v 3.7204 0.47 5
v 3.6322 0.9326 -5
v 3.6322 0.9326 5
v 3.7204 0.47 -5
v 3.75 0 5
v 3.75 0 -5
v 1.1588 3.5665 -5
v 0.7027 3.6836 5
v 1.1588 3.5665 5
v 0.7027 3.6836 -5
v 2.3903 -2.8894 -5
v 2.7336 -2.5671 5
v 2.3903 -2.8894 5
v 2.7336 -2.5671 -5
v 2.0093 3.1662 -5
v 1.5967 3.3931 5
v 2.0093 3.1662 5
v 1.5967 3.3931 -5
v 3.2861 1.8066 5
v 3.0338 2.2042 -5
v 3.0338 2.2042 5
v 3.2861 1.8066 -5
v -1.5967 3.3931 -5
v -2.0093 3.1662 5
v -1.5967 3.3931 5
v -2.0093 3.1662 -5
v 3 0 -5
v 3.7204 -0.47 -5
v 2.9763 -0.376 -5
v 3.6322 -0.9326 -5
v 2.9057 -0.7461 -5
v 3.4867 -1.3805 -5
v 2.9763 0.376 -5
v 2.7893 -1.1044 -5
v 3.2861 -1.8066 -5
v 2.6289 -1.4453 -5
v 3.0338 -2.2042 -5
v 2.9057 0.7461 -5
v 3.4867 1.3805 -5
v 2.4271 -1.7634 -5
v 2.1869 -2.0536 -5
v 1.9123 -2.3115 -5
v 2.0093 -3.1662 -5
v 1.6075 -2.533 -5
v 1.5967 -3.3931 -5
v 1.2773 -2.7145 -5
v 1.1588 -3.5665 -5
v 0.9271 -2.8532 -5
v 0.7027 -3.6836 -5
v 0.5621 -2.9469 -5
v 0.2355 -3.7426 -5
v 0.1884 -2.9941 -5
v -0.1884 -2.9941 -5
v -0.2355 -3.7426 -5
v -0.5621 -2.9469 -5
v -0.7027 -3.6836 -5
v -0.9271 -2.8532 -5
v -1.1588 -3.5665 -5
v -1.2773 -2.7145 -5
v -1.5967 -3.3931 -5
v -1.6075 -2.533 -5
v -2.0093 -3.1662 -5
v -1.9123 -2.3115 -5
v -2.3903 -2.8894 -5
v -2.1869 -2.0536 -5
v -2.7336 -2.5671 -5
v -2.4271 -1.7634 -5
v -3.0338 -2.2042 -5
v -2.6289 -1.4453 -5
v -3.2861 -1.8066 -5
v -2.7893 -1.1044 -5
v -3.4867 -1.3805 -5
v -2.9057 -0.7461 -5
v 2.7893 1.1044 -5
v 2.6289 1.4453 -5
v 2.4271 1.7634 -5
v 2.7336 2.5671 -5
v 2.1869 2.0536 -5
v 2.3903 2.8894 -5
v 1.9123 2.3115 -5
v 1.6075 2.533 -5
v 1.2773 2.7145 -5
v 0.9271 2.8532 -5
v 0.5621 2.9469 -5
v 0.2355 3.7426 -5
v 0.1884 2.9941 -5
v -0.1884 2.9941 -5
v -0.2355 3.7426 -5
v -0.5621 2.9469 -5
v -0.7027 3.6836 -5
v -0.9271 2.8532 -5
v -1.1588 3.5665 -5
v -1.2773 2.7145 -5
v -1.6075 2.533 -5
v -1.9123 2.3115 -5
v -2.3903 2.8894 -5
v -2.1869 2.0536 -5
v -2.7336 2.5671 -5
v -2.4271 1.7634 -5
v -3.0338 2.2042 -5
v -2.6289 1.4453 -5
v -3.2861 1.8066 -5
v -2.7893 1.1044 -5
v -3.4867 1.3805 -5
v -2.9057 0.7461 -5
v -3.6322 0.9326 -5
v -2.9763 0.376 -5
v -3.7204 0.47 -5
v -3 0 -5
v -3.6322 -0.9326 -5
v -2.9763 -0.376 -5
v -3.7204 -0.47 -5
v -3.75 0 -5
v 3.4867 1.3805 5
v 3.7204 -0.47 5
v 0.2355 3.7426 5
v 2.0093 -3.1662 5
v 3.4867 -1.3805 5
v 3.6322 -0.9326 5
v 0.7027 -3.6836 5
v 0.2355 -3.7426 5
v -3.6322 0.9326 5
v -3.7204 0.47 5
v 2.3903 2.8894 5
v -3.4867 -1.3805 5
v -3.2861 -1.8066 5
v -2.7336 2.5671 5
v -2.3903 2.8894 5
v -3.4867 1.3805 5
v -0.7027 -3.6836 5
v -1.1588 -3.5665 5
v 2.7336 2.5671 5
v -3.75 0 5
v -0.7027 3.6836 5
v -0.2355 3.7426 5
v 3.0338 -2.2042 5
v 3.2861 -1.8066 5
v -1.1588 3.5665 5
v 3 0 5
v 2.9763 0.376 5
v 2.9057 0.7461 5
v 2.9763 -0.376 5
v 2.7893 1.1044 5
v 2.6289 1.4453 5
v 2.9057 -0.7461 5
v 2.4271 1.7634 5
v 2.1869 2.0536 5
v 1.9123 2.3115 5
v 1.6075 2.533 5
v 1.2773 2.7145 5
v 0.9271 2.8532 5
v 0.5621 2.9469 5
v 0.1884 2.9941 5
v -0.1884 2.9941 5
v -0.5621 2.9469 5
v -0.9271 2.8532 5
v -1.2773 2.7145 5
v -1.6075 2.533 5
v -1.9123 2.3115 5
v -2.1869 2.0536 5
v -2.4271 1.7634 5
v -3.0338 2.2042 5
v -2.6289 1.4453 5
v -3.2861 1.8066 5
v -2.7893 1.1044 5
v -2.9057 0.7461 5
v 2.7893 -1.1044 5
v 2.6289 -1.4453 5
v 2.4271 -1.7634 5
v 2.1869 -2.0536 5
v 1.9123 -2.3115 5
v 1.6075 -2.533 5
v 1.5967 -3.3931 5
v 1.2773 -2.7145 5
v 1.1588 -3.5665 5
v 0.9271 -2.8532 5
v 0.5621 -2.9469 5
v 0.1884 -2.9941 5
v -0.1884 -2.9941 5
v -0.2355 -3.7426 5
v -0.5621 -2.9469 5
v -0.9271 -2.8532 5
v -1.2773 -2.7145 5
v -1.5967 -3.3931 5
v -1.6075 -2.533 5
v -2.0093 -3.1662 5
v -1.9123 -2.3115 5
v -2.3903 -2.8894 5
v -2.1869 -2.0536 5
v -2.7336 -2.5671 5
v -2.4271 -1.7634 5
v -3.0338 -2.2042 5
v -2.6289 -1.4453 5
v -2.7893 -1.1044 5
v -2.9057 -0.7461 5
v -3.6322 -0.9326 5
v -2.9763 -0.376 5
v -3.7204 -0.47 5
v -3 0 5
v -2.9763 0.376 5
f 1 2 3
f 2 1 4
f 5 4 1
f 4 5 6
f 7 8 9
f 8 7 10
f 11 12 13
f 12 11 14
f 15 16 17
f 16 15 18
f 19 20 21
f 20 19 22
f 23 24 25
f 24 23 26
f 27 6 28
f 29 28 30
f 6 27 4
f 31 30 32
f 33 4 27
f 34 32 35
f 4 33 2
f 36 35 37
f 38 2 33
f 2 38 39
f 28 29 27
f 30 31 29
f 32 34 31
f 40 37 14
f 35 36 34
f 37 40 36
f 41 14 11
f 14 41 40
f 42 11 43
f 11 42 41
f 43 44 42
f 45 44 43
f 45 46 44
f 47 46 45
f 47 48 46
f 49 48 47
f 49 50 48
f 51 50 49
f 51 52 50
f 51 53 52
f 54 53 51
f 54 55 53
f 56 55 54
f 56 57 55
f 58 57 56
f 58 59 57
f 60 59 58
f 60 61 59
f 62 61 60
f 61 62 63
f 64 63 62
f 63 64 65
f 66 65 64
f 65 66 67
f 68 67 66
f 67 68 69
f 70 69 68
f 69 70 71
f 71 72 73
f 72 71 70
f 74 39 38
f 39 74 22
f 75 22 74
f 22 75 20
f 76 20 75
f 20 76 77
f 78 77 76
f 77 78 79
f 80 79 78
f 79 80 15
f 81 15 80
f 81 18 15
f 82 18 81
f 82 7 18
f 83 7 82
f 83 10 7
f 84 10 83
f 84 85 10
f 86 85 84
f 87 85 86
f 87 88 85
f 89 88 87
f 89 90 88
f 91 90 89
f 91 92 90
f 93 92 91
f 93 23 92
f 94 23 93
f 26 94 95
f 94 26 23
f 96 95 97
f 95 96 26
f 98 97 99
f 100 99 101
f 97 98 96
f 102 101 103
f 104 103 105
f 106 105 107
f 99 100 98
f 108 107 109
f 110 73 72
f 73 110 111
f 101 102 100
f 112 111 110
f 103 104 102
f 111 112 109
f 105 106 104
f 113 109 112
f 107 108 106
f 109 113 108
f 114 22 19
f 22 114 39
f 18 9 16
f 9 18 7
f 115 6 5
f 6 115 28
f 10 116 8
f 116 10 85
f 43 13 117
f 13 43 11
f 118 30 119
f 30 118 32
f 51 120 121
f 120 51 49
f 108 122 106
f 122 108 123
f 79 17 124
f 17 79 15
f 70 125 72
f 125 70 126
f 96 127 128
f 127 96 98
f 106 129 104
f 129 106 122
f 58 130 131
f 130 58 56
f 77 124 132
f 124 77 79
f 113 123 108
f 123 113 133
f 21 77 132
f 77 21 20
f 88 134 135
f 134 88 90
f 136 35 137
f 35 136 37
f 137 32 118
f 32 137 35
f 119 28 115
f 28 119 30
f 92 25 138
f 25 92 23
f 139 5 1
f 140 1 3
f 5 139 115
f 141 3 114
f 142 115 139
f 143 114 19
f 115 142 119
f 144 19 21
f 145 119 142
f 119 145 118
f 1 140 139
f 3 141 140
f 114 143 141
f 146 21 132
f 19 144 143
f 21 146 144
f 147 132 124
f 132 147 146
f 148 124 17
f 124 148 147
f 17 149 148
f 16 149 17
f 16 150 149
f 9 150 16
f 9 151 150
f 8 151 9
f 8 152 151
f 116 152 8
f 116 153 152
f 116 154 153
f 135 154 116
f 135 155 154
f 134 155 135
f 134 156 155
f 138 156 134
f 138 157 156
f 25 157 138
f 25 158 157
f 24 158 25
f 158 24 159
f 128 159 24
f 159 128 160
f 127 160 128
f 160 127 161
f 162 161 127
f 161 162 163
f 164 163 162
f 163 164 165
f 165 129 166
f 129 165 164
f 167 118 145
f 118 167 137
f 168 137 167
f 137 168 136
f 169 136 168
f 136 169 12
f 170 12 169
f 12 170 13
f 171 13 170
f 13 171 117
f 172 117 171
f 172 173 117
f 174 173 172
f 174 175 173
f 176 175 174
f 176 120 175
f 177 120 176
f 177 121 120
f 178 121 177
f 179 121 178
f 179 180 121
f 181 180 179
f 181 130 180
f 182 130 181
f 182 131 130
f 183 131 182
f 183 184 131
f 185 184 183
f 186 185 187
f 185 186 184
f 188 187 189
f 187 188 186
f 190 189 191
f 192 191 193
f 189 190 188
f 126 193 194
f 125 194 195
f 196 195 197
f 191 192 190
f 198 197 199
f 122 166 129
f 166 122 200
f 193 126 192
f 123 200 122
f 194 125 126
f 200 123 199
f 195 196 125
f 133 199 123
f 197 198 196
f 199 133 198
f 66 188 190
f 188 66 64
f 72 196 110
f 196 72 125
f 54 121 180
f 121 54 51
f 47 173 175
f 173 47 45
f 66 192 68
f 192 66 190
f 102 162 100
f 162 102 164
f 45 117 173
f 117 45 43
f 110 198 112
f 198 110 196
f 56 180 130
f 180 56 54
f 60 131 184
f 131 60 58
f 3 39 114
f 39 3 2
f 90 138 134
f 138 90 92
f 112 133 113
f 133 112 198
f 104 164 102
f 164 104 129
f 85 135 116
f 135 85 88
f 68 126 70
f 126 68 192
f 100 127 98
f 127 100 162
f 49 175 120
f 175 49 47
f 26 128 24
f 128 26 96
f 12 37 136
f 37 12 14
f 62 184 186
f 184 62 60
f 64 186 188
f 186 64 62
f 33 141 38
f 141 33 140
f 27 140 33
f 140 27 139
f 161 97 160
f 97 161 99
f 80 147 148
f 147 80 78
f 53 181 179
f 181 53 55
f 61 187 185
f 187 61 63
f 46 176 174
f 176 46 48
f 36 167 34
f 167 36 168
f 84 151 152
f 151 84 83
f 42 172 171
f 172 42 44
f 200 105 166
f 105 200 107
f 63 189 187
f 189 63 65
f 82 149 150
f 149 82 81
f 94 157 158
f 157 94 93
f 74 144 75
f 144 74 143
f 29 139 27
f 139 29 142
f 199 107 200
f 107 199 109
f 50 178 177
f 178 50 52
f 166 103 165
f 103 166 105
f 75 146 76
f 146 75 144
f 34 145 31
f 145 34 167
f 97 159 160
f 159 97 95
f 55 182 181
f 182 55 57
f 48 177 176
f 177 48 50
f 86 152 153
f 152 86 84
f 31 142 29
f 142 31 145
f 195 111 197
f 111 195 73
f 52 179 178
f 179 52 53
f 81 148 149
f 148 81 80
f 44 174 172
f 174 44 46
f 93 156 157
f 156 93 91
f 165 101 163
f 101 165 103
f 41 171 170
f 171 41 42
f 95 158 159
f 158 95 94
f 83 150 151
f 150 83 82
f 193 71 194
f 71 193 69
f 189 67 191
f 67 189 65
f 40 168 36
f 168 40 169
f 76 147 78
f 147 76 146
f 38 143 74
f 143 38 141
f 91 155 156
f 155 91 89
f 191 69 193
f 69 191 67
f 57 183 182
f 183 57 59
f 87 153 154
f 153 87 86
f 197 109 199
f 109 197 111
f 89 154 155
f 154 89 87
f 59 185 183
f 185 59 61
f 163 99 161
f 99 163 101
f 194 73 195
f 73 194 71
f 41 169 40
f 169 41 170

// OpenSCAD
$fn = 50;


difference() {
	union() {
		translate(v = [0, 0, -5.0000000000]) {
			cylinder(h = 10, r = 3.7500000000);
		}
	}
	union() {
		translate(v = [0, 0, -100.0000000000]) {
			cylinder(h = 200, r = 3.0000000000);
		}
	}
}
